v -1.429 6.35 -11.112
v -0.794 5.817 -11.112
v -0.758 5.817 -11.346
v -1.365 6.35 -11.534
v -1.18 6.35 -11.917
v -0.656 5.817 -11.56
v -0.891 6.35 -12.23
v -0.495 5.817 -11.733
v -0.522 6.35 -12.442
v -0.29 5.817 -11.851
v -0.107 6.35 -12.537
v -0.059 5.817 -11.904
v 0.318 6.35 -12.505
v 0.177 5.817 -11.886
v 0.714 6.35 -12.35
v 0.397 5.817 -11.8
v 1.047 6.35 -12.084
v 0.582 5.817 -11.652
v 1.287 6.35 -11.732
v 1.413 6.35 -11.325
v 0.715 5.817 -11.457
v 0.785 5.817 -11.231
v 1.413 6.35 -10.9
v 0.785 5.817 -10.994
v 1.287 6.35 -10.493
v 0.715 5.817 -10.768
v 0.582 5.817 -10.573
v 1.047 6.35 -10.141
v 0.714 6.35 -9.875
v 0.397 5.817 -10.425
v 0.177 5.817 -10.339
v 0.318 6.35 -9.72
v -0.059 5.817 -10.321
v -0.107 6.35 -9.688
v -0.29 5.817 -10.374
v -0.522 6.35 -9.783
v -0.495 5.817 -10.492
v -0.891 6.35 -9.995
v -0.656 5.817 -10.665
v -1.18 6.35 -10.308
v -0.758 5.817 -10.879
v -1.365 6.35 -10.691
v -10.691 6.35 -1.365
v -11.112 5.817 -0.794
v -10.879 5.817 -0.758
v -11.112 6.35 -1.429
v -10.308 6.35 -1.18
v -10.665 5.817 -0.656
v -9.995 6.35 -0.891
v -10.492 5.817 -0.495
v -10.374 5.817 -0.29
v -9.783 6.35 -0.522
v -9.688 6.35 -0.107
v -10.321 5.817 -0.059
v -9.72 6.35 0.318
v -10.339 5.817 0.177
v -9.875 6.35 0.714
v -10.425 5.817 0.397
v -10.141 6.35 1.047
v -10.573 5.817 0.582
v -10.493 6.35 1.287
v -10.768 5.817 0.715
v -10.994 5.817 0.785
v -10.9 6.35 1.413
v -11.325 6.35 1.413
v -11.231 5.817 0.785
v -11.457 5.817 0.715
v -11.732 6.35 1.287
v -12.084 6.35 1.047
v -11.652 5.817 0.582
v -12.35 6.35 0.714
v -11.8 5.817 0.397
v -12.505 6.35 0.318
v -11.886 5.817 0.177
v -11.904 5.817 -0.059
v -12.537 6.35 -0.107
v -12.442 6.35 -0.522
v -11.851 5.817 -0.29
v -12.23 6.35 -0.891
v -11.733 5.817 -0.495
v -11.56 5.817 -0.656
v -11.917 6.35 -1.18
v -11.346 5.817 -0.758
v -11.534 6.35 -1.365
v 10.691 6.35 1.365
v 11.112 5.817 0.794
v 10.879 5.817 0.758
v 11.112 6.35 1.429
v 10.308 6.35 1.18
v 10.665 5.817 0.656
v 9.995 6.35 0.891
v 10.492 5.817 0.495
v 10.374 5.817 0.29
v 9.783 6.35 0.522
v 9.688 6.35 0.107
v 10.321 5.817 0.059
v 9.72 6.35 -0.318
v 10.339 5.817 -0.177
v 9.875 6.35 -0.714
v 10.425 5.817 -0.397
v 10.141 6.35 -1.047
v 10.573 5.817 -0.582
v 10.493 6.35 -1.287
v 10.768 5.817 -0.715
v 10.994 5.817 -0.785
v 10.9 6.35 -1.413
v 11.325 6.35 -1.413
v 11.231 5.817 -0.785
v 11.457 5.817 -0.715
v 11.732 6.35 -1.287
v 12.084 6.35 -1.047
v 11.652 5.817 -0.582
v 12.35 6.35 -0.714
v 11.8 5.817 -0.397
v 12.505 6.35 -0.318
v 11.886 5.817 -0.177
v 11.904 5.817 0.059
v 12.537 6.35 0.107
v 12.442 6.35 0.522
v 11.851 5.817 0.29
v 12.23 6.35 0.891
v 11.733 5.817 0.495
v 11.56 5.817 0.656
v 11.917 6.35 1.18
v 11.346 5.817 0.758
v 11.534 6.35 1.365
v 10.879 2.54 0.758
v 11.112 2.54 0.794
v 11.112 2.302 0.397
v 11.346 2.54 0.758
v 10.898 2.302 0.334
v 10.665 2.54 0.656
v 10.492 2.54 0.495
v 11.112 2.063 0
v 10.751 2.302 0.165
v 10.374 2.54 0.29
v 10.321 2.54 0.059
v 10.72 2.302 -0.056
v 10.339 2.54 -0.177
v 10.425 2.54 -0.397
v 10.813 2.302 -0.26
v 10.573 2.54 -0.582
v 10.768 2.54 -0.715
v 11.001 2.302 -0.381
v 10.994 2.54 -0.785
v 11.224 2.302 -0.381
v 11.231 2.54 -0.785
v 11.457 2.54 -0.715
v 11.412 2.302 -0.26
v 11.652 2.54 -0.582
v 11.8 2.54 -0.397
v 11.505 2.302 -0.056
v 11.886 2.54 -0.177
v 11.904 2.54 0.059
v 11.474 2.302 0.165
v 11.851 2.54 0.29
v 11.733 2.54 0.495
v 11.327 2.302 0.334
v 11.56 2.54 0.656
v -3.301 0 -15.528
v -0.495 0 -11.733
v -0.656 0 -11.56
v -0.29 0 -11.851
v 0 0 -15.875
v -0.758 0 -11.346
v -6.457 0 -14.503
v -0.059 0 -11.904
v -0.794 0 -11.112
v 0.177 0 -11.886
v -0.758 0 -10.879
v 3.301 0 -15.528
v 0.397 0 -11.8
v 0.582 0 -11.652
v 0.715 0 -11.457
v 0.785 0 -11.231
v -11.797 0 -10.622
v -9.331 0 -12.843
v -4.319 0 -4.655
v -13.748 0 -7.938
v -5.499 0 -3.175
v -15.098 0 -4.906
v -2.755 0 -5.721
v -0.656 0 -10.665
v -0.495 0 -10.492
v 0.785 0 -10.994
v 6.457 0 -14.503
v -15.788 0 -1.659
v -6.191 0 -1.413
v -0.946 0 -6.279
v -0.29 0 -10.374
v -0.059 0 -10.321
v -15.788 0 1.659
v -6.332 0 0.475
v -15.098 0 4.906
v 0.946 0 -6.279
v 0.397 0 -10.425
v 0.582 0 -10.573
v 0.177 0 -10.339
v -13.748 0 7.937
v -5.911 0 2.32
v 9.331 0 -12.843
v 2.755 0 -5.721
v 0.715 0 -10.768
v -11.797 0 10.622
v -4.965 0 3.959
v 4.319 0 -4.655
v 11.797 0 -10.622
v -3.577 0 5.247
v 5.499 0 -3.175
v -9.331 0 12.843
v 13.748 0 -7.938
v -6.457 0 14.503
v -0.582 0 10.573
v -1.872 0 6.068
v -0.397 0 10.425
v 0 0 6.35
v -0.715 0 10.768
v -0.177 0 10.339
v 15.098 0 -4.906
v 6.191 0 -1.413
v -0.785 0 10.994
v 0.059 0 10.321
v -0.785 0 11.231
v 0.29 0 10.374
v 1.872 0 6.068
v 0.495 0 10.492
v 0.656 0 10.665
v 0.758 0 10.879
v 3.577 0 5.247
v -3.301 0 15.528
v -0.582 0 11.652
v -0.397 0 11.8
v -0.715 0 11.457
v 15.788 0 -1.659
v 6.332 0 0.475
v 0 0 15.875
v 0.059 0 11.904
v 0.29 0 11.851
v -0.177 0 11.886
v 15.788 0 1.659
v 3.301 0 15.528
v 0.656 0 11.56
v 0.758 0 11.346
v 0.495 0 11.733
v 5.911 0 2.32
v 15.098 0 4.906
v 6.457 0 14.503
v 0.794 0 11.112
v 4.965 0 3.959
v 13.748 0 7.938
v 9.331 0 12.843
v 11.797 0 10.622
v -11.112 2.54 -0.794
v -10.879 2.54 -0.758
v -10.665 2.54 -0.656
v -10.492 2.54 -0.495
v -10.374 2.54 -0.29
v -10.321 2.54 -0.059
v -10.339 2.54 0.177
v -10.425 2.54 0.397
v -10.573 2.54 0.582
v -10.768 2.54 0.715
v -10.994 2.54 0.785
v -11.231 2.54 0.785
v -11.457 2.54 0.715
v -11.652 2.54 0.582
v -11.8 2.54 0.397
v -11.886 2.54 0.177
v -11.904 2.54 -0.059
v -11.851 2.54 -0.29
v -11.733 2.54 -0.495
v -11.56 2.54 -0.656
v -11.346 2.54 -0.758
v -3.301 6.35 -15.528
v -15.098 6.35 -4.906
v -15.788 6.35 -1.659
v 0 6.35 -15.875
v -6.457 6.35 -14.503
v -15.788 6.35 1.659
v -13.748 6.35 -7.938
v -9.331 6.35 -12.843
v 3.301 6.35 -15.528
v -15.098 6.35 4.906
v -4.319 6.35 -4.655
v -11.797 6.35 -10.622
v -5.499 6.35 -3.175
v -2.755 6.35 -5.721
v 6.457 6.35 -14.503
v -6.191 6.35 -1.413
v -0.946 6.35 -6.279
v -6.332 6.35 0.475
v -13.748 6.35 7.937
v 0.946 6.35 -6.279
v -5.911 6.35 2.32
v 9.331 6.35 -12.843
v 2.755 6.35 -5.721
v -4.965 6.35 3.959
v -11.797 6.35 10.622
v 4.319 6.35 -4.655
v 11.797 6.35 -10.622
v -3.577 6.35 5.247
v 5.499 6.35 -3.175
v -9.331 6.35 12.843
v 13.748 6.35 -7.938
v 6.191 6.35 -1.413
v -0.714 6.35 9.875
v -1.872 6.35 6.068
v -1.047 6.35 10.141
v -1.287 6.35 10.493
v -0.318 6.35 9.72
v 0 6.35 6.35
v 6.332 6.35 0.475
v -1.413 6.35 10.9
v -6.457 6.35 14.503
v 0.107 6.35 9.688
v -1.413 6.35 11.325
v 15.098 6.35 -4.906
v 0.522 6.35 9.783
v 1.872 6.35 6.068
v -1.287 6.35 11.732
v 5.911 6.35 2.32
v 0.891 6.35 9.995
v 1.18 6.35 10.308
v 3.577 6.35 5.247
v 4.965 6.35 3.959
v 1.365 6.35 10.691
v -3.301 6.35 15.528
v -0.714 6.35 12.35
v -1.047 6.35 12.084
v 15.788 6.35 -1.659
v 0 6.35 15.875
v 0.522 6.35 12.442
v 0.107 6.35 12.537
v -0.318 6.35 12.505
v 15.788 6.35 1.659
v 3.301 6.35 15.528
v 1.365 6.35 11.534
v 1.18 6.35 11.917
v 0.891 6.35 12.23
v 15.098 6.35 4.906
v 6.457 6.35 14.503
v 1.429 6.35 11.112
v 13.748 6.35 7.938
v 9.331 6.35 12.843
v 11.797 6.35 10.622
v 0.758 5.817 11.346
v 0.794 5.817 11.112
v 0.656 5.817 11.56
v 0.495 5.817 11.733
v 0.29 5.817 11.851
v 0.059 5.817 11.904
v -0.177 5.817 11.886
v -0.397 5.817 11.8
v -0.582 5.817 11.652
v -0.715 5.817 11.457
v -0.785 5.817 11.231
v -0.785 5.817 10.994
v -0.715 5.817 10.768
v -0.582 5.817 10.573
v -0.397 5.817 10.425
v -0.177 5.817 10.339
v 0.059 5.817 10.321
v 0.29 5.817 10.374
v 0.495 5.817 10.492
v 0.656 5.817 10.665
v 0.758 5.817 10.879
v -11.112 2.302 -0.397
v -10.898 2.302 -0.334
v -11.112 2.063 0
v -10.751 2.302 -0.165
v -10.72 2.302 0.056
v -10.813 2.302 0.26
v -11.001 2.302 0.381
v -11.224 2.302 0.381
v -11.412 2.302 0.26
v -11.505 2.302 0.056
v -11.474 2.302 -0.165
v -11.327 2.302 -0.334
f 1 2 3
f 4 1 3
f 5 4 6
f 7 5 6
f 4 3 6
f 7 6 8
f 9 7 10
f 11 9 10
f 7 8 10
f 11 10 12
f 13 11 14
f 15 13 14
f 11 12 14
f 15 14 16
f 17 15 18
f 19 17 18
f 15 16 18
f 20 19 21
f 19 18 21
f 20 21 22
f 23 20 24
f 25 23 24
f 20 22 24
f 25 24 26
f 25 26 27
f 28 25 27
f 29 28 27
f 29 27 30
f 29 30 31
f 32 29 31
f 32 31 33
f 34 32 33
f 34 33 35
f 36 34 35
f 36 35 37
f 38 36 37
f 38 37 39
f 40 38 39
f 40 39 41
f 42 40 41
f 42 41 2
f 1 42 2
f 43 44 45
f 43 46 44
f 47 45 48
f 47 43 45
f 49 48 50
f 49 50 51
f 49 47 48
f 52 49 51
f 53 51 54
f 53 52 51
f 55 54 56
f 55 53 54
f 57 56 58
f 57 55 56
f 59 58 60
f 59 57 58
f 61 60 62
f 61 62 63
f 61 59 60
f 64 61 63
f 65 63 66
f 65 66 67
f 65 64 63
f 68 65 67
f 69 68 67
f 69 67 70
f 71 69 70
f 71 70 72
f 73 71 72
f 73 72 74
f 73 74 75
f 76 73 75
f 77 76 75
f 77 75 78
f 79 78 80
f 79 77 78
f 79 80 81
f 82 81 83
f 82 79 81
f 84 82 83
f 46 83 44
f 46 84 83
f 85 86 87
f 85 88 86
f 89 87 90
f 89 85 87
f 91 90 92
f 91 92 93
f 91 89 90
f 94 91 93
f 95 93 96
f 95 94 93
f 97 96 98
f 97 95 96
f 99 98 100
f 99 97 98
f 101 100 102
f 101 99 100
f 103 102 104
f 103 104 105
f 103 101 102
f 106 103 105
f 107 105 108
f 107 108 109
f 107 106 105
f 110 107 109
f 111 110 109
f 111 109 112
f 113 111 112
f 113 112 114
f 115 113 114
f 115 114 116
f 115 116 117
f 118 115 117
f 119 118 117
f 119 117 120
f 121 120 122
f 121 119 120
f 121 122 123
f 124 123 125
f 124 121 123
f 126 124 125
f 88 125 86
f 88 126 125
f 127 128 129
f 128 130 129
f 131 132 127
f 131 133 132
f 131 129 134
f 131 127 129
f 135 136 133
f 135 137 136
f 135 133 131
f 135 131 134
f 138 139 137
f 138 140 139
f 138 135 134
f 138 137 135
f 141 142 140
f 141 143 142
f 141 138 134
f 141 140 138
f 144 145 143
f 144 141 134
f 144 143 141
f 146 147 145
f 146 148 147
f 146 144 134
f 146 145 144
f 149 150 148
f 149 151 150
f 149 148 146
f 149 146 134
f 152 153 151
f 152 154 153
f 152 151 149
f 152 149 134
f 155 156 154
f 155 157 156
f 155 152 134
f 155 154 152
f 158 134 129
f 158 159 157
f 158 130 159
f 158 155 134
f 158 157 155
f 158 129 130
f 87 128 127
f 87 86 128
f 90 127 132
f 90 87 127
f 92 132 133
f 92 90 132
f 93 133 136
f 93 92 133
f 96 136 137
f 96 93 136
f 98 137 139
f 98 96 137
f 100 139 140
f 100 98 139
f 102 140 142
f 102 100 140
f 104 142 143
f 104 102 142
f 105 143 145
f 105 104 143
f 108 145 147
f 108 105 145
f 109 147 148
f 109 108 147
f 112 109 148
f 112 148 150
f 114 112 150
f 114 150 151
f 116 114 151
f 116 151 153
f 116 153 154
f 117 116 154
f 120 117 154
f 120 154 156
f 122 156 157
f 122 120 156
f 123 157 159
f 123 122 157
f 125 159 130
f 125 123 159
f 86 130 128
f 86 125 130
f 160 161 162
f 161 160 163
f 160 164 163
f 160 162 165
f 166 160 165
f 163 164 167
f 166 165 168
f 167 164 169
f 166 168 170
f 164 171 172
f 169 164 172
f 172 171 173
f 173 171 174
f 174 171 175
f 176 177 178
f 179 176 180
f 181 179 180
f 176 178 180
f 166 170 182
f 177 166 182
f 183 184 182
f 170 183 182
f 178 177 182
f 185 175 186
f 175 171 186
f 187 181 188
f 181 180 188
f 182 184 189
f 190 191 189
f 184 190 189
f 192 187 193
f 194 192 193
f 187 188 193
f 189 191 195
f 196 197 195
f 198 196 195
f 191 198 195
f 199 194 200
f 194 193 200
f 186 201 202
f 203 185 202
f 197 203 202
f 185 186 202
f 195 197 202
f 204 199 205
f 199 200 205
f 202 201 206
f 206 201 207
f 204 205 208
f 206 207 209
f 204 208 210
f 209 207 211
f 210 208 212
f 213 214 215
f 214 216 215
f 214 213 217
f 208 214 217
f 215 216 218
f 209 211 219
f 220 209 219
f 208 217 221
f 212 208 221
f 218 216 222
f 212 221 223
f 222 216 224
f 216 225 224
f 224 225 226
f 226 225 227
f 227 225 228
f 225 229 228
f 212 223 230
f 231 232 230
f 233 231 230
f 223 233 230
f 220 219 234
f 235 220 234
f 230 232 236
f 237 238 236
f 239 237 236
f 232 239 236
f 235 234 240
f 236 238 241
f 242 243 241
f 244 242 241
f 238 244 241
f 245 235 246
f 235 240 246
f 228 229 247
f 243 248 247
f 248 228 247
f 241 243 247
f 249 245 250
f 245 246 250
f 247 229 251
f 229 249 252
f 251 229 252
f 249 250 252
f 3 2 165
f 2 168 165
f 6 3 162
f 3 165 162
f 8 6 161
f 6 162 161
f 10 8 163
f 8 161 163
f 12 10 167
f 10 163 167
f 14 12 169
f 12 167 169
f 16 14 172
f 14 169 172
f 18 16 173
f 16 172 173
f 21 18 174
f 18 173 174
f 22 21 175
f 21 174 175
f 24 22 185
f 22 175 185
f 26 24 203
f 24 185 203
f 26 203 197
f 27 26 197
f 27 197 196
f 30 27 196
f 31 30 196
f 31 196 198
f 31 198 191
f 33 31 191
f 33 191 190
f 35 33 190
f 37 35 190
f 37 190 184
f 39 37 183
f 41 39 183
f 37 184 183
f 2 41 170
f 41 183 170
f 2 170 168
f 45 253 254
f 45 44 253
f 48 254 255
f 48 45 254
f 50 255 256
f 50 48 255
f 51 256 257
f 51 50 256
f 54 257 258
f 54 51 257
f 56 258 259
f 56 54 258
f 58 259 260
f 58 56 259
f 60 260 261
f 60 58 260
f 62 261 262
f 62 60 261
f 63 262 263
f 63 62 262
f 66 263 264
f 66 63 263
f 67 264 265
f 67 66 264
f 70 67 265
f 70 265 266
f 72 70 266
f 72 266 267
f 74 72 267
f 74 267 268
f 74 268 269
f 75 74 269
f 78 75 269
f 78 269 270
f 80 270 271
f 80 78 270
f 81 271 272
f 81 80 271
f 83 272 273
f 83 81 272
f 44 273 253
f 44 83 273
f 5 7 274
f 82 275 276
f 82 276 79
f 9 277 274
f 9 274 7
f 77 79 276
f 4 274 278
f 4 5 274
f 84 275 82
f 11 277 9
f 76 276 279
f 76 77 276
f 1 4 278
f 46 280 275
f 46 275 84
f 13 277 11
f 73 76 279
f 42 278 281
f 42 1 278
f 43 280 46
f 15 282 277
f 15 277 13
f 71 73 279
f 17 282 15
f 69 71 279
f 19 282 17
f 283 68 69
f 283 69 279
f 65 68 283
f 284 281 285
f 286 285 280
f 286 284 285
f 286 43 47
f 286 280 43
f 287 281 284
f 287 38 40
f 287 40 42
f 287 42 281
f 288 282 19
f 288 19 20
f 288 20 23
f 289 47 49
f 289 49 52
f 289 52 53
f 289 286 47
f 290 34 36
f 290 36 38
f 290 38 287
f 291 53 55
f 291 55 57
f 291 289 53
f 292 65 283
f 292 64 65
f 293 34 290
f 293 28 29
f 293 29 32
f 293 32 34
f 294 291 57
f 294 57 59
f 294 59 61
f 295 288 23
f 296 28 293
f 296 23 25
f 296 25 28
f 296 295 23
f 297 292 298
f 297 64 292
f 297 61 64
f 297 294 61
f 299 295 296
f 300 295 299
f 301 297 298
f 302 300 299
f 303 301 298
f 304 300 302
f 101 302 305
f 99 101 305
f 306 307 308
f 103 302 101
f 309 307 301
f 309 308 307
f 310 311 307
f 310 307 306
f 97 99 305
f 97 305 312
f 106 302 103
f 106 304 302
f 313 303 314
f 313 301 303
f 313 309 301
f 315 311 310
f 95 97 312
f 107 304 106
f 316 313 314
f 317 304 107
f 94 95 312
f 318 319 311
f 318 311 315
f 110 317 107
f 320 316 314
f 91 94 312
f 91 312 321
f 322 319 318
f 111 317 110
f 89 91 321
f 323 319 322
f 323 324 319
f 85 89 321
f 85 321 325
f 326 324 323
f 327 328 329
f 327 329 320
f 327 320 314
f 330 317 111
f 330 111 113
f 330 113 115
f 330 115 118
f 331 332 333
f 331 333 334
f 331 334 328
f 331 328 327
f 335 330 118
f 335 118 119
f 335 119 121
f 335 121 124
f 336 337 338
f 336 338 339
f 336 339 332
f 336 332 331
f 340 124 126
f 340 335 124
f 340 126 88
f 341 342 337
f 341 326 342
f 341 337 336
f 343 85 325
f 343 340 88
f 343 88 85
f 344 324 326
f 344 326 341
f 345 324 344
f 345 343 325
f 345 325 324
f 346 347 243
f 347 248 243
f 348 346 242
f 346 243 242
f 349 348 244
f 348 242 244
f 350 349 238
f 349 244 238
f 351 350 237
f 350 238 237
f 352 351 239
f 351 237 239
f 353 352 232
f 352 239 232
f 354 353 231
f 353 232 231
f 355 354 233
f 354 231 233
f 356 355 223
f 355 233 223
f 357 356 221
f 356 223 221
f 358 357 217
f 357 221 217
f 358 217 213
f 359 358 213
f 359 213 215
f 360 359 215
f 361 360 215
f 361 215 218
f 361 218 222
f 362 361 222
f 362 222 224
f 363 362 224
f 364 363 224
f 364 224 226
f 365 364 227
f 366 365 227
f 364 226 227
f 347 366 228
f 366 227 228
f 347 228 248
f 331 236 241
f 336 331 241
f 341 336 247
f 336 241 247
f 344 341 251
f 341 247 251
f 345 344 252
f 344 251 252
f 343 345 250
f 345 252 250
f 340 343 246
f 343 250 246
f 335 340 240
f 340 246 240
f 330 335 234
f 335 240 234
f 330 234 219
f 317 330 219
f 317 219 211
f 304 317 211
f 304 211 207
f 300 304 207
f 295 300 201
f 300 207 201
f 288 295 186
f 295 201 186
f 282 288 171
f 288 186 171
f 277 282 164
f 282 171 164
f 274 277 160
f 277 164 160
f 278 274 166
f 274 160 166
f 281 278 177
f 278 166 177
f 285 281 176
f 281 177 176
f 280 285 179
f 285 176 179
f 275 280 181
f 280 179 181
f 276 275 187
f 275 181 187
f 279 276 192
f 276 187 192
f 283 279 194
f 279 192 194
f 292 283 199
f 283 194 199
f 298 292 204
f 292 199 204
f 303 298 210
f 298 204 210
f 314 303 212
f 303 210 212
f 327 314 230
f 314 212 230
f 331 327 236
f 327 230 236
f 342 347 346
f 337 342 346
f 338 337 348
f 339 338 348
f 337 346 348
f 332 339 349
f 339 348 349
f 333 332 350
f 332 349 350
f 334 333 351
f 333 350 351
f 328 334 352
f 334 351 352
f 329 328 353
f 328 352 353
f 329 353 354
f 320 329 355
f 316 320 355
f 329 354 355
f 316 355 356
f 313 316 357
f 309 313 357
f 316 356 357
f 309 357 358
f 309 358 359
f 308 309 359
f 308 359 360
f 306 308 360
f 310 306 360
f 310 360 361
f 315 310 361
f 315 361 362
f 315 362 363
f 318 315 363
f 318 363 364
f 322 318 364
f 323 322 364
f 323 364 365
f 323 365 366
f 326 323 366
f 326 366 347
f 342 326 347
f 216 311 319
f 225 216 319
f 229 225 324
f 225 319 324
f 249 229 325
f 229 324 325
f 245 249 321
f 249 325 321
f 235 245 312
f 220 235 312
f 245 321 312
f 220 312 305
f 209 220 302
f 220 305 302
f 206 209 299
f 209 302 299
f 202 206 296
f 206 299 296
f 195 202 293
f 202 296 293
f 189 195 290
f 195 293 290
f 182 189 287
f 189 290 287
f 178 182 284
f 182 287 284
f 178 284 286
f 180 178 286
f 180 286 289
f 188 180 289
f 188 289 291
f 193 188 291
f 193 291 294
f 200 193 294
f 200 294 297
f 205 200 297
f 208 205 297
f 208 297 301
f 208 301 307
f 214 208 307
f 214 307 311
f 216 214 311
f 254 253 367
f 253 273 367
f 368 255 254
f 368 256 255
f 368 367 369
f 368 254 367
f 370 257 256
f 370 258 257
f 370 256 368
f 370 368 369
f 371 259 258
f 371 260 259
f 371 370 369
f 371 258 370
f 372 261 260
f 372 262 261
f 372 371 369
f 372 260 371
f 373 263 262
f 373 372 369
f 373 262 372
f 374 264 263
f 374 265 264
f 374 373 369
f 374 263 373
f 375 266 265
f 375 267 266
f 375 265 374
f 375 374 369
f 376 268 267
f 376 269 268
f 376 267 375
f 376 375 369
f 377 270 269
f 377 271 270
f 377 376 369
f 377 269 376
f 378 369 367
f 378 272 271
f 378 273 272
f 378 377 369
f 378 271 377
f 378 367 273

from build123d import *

# Parameters (mm, degrees)
SKETCH1_R                                = 15.875
BOSS_EXTRUDE1_DEPTH                      = 6.35
SKETCH2_R                                = 6.35
CUT_EXTRUDE1_DEPTH                       = 24.3313898
F_1_16_0_0625_DIAMETER_HOLE1_D           = 1.5875
F_1_16_0_0625_DIAMETER_HOLE1_CSINK_D     = 2.8575
F_1_16_0_0625_DIAMETER_HOLE1_CSINK_ANGLE = 100
CIRPATTERN1_COUNT                        = 2
CIRPATTERN2_COUNT                        = 2


with BuildPart() as part:
    # Sketch1 → Boss-Extrude1 (new body)
    with BuildSketch(Plane(origin=(0, 0, 0), x_dir=(1, 0, 0), z_dir=(0, 1, 0))):
        with Locations(Location((0, 0, 0), (0, 0, 270))):
            Circle(SKETCH1_R)
    extrude(amount=BOSS_EXTRUDE1_DEPTH)

    # Sketch2 → Cut-Extrude1 (cut, through all)
    with BuildSketch(Plane(origin=(0, 6.35, 0), x_dir=(1, 0, 0), z_dir=(0, 1, 0))):
        with Locations(Location((0, 0, 0), (0, 0, 270))):
            Circle(SKETCH2_R)
    extrude(amount=-CUT_EXTRUDE1_DEPTH, mode=Mode.SUBTRACT)

    # 1/16 (0.0625) Diameter Hole1 (through all)
    with Locations(Plane(origin=(0, 6.35, 0), x_dir=(1, 0, 0), z_dir=(0, 1, 0))):
        with Locations((0, 11.1125)):
            f_1_16_0_0625_diameter_hole1 = CounterSinkHole(F_1_16_0_0625_DIAMETER_HOLE1_D / 2, F_1_16_0_0625_DIAMETER_HOLE1_CSINK_D / 2, counter_sink_angle=F_1_16_0_0625_DIAMETER_HOLE1_CSINK_ANGLE)

    # CirPattern1: 1/16 (0.0625) Diameter Hole1 ×2 about axis
    cirpattern1_axis = Axis((0, 0, 0), (0, 1, 0))
    for i in range(1, CIRPATTERN1_COUNT):
        add(f_1_16_0_0625_diameter_hole1.rotate(cirpattern1_axis, i * 360 / CIRPATTERN1_COUNT), mode=Mode.SUBTRACT)

    # Sketch10 → 1/16 (0.0625) Diameter Hole2 (revolve, cut)
    with BuildSketch(Plane(origin=(11.1125, 6.35, 0), x_dir=(0, 0, 1), z_dir=(1, 0, 0))):
        Polygon((0, 0), (0, 4.286933116), (0.79375, 3.81), (0.79375, 0.532828266), (1.42875, 0), align=None)
    f_1_16_0_0625_diameter_hole2 = revolve(axis=Axis((11.1125, 12.7, 0), (0, -1, 0)), mode=Mode.SUBTRACT)

    # CirPattern2: 1/16 (0.0625) Diameter Hole2 ×2 about axis
    cirpattern2_axis = Axis((0, 0, 0), (0, 1, 0))
    for i in range(1, CIRPATTERN2_COUNT):
        add(f_1_16_0_0625_diameter_hole2.rotate(cirpattern2_axis, i * 360 / CIRPATTERN2_COUNT), mode=Mode.SUBTRACT)


solid = part.part
